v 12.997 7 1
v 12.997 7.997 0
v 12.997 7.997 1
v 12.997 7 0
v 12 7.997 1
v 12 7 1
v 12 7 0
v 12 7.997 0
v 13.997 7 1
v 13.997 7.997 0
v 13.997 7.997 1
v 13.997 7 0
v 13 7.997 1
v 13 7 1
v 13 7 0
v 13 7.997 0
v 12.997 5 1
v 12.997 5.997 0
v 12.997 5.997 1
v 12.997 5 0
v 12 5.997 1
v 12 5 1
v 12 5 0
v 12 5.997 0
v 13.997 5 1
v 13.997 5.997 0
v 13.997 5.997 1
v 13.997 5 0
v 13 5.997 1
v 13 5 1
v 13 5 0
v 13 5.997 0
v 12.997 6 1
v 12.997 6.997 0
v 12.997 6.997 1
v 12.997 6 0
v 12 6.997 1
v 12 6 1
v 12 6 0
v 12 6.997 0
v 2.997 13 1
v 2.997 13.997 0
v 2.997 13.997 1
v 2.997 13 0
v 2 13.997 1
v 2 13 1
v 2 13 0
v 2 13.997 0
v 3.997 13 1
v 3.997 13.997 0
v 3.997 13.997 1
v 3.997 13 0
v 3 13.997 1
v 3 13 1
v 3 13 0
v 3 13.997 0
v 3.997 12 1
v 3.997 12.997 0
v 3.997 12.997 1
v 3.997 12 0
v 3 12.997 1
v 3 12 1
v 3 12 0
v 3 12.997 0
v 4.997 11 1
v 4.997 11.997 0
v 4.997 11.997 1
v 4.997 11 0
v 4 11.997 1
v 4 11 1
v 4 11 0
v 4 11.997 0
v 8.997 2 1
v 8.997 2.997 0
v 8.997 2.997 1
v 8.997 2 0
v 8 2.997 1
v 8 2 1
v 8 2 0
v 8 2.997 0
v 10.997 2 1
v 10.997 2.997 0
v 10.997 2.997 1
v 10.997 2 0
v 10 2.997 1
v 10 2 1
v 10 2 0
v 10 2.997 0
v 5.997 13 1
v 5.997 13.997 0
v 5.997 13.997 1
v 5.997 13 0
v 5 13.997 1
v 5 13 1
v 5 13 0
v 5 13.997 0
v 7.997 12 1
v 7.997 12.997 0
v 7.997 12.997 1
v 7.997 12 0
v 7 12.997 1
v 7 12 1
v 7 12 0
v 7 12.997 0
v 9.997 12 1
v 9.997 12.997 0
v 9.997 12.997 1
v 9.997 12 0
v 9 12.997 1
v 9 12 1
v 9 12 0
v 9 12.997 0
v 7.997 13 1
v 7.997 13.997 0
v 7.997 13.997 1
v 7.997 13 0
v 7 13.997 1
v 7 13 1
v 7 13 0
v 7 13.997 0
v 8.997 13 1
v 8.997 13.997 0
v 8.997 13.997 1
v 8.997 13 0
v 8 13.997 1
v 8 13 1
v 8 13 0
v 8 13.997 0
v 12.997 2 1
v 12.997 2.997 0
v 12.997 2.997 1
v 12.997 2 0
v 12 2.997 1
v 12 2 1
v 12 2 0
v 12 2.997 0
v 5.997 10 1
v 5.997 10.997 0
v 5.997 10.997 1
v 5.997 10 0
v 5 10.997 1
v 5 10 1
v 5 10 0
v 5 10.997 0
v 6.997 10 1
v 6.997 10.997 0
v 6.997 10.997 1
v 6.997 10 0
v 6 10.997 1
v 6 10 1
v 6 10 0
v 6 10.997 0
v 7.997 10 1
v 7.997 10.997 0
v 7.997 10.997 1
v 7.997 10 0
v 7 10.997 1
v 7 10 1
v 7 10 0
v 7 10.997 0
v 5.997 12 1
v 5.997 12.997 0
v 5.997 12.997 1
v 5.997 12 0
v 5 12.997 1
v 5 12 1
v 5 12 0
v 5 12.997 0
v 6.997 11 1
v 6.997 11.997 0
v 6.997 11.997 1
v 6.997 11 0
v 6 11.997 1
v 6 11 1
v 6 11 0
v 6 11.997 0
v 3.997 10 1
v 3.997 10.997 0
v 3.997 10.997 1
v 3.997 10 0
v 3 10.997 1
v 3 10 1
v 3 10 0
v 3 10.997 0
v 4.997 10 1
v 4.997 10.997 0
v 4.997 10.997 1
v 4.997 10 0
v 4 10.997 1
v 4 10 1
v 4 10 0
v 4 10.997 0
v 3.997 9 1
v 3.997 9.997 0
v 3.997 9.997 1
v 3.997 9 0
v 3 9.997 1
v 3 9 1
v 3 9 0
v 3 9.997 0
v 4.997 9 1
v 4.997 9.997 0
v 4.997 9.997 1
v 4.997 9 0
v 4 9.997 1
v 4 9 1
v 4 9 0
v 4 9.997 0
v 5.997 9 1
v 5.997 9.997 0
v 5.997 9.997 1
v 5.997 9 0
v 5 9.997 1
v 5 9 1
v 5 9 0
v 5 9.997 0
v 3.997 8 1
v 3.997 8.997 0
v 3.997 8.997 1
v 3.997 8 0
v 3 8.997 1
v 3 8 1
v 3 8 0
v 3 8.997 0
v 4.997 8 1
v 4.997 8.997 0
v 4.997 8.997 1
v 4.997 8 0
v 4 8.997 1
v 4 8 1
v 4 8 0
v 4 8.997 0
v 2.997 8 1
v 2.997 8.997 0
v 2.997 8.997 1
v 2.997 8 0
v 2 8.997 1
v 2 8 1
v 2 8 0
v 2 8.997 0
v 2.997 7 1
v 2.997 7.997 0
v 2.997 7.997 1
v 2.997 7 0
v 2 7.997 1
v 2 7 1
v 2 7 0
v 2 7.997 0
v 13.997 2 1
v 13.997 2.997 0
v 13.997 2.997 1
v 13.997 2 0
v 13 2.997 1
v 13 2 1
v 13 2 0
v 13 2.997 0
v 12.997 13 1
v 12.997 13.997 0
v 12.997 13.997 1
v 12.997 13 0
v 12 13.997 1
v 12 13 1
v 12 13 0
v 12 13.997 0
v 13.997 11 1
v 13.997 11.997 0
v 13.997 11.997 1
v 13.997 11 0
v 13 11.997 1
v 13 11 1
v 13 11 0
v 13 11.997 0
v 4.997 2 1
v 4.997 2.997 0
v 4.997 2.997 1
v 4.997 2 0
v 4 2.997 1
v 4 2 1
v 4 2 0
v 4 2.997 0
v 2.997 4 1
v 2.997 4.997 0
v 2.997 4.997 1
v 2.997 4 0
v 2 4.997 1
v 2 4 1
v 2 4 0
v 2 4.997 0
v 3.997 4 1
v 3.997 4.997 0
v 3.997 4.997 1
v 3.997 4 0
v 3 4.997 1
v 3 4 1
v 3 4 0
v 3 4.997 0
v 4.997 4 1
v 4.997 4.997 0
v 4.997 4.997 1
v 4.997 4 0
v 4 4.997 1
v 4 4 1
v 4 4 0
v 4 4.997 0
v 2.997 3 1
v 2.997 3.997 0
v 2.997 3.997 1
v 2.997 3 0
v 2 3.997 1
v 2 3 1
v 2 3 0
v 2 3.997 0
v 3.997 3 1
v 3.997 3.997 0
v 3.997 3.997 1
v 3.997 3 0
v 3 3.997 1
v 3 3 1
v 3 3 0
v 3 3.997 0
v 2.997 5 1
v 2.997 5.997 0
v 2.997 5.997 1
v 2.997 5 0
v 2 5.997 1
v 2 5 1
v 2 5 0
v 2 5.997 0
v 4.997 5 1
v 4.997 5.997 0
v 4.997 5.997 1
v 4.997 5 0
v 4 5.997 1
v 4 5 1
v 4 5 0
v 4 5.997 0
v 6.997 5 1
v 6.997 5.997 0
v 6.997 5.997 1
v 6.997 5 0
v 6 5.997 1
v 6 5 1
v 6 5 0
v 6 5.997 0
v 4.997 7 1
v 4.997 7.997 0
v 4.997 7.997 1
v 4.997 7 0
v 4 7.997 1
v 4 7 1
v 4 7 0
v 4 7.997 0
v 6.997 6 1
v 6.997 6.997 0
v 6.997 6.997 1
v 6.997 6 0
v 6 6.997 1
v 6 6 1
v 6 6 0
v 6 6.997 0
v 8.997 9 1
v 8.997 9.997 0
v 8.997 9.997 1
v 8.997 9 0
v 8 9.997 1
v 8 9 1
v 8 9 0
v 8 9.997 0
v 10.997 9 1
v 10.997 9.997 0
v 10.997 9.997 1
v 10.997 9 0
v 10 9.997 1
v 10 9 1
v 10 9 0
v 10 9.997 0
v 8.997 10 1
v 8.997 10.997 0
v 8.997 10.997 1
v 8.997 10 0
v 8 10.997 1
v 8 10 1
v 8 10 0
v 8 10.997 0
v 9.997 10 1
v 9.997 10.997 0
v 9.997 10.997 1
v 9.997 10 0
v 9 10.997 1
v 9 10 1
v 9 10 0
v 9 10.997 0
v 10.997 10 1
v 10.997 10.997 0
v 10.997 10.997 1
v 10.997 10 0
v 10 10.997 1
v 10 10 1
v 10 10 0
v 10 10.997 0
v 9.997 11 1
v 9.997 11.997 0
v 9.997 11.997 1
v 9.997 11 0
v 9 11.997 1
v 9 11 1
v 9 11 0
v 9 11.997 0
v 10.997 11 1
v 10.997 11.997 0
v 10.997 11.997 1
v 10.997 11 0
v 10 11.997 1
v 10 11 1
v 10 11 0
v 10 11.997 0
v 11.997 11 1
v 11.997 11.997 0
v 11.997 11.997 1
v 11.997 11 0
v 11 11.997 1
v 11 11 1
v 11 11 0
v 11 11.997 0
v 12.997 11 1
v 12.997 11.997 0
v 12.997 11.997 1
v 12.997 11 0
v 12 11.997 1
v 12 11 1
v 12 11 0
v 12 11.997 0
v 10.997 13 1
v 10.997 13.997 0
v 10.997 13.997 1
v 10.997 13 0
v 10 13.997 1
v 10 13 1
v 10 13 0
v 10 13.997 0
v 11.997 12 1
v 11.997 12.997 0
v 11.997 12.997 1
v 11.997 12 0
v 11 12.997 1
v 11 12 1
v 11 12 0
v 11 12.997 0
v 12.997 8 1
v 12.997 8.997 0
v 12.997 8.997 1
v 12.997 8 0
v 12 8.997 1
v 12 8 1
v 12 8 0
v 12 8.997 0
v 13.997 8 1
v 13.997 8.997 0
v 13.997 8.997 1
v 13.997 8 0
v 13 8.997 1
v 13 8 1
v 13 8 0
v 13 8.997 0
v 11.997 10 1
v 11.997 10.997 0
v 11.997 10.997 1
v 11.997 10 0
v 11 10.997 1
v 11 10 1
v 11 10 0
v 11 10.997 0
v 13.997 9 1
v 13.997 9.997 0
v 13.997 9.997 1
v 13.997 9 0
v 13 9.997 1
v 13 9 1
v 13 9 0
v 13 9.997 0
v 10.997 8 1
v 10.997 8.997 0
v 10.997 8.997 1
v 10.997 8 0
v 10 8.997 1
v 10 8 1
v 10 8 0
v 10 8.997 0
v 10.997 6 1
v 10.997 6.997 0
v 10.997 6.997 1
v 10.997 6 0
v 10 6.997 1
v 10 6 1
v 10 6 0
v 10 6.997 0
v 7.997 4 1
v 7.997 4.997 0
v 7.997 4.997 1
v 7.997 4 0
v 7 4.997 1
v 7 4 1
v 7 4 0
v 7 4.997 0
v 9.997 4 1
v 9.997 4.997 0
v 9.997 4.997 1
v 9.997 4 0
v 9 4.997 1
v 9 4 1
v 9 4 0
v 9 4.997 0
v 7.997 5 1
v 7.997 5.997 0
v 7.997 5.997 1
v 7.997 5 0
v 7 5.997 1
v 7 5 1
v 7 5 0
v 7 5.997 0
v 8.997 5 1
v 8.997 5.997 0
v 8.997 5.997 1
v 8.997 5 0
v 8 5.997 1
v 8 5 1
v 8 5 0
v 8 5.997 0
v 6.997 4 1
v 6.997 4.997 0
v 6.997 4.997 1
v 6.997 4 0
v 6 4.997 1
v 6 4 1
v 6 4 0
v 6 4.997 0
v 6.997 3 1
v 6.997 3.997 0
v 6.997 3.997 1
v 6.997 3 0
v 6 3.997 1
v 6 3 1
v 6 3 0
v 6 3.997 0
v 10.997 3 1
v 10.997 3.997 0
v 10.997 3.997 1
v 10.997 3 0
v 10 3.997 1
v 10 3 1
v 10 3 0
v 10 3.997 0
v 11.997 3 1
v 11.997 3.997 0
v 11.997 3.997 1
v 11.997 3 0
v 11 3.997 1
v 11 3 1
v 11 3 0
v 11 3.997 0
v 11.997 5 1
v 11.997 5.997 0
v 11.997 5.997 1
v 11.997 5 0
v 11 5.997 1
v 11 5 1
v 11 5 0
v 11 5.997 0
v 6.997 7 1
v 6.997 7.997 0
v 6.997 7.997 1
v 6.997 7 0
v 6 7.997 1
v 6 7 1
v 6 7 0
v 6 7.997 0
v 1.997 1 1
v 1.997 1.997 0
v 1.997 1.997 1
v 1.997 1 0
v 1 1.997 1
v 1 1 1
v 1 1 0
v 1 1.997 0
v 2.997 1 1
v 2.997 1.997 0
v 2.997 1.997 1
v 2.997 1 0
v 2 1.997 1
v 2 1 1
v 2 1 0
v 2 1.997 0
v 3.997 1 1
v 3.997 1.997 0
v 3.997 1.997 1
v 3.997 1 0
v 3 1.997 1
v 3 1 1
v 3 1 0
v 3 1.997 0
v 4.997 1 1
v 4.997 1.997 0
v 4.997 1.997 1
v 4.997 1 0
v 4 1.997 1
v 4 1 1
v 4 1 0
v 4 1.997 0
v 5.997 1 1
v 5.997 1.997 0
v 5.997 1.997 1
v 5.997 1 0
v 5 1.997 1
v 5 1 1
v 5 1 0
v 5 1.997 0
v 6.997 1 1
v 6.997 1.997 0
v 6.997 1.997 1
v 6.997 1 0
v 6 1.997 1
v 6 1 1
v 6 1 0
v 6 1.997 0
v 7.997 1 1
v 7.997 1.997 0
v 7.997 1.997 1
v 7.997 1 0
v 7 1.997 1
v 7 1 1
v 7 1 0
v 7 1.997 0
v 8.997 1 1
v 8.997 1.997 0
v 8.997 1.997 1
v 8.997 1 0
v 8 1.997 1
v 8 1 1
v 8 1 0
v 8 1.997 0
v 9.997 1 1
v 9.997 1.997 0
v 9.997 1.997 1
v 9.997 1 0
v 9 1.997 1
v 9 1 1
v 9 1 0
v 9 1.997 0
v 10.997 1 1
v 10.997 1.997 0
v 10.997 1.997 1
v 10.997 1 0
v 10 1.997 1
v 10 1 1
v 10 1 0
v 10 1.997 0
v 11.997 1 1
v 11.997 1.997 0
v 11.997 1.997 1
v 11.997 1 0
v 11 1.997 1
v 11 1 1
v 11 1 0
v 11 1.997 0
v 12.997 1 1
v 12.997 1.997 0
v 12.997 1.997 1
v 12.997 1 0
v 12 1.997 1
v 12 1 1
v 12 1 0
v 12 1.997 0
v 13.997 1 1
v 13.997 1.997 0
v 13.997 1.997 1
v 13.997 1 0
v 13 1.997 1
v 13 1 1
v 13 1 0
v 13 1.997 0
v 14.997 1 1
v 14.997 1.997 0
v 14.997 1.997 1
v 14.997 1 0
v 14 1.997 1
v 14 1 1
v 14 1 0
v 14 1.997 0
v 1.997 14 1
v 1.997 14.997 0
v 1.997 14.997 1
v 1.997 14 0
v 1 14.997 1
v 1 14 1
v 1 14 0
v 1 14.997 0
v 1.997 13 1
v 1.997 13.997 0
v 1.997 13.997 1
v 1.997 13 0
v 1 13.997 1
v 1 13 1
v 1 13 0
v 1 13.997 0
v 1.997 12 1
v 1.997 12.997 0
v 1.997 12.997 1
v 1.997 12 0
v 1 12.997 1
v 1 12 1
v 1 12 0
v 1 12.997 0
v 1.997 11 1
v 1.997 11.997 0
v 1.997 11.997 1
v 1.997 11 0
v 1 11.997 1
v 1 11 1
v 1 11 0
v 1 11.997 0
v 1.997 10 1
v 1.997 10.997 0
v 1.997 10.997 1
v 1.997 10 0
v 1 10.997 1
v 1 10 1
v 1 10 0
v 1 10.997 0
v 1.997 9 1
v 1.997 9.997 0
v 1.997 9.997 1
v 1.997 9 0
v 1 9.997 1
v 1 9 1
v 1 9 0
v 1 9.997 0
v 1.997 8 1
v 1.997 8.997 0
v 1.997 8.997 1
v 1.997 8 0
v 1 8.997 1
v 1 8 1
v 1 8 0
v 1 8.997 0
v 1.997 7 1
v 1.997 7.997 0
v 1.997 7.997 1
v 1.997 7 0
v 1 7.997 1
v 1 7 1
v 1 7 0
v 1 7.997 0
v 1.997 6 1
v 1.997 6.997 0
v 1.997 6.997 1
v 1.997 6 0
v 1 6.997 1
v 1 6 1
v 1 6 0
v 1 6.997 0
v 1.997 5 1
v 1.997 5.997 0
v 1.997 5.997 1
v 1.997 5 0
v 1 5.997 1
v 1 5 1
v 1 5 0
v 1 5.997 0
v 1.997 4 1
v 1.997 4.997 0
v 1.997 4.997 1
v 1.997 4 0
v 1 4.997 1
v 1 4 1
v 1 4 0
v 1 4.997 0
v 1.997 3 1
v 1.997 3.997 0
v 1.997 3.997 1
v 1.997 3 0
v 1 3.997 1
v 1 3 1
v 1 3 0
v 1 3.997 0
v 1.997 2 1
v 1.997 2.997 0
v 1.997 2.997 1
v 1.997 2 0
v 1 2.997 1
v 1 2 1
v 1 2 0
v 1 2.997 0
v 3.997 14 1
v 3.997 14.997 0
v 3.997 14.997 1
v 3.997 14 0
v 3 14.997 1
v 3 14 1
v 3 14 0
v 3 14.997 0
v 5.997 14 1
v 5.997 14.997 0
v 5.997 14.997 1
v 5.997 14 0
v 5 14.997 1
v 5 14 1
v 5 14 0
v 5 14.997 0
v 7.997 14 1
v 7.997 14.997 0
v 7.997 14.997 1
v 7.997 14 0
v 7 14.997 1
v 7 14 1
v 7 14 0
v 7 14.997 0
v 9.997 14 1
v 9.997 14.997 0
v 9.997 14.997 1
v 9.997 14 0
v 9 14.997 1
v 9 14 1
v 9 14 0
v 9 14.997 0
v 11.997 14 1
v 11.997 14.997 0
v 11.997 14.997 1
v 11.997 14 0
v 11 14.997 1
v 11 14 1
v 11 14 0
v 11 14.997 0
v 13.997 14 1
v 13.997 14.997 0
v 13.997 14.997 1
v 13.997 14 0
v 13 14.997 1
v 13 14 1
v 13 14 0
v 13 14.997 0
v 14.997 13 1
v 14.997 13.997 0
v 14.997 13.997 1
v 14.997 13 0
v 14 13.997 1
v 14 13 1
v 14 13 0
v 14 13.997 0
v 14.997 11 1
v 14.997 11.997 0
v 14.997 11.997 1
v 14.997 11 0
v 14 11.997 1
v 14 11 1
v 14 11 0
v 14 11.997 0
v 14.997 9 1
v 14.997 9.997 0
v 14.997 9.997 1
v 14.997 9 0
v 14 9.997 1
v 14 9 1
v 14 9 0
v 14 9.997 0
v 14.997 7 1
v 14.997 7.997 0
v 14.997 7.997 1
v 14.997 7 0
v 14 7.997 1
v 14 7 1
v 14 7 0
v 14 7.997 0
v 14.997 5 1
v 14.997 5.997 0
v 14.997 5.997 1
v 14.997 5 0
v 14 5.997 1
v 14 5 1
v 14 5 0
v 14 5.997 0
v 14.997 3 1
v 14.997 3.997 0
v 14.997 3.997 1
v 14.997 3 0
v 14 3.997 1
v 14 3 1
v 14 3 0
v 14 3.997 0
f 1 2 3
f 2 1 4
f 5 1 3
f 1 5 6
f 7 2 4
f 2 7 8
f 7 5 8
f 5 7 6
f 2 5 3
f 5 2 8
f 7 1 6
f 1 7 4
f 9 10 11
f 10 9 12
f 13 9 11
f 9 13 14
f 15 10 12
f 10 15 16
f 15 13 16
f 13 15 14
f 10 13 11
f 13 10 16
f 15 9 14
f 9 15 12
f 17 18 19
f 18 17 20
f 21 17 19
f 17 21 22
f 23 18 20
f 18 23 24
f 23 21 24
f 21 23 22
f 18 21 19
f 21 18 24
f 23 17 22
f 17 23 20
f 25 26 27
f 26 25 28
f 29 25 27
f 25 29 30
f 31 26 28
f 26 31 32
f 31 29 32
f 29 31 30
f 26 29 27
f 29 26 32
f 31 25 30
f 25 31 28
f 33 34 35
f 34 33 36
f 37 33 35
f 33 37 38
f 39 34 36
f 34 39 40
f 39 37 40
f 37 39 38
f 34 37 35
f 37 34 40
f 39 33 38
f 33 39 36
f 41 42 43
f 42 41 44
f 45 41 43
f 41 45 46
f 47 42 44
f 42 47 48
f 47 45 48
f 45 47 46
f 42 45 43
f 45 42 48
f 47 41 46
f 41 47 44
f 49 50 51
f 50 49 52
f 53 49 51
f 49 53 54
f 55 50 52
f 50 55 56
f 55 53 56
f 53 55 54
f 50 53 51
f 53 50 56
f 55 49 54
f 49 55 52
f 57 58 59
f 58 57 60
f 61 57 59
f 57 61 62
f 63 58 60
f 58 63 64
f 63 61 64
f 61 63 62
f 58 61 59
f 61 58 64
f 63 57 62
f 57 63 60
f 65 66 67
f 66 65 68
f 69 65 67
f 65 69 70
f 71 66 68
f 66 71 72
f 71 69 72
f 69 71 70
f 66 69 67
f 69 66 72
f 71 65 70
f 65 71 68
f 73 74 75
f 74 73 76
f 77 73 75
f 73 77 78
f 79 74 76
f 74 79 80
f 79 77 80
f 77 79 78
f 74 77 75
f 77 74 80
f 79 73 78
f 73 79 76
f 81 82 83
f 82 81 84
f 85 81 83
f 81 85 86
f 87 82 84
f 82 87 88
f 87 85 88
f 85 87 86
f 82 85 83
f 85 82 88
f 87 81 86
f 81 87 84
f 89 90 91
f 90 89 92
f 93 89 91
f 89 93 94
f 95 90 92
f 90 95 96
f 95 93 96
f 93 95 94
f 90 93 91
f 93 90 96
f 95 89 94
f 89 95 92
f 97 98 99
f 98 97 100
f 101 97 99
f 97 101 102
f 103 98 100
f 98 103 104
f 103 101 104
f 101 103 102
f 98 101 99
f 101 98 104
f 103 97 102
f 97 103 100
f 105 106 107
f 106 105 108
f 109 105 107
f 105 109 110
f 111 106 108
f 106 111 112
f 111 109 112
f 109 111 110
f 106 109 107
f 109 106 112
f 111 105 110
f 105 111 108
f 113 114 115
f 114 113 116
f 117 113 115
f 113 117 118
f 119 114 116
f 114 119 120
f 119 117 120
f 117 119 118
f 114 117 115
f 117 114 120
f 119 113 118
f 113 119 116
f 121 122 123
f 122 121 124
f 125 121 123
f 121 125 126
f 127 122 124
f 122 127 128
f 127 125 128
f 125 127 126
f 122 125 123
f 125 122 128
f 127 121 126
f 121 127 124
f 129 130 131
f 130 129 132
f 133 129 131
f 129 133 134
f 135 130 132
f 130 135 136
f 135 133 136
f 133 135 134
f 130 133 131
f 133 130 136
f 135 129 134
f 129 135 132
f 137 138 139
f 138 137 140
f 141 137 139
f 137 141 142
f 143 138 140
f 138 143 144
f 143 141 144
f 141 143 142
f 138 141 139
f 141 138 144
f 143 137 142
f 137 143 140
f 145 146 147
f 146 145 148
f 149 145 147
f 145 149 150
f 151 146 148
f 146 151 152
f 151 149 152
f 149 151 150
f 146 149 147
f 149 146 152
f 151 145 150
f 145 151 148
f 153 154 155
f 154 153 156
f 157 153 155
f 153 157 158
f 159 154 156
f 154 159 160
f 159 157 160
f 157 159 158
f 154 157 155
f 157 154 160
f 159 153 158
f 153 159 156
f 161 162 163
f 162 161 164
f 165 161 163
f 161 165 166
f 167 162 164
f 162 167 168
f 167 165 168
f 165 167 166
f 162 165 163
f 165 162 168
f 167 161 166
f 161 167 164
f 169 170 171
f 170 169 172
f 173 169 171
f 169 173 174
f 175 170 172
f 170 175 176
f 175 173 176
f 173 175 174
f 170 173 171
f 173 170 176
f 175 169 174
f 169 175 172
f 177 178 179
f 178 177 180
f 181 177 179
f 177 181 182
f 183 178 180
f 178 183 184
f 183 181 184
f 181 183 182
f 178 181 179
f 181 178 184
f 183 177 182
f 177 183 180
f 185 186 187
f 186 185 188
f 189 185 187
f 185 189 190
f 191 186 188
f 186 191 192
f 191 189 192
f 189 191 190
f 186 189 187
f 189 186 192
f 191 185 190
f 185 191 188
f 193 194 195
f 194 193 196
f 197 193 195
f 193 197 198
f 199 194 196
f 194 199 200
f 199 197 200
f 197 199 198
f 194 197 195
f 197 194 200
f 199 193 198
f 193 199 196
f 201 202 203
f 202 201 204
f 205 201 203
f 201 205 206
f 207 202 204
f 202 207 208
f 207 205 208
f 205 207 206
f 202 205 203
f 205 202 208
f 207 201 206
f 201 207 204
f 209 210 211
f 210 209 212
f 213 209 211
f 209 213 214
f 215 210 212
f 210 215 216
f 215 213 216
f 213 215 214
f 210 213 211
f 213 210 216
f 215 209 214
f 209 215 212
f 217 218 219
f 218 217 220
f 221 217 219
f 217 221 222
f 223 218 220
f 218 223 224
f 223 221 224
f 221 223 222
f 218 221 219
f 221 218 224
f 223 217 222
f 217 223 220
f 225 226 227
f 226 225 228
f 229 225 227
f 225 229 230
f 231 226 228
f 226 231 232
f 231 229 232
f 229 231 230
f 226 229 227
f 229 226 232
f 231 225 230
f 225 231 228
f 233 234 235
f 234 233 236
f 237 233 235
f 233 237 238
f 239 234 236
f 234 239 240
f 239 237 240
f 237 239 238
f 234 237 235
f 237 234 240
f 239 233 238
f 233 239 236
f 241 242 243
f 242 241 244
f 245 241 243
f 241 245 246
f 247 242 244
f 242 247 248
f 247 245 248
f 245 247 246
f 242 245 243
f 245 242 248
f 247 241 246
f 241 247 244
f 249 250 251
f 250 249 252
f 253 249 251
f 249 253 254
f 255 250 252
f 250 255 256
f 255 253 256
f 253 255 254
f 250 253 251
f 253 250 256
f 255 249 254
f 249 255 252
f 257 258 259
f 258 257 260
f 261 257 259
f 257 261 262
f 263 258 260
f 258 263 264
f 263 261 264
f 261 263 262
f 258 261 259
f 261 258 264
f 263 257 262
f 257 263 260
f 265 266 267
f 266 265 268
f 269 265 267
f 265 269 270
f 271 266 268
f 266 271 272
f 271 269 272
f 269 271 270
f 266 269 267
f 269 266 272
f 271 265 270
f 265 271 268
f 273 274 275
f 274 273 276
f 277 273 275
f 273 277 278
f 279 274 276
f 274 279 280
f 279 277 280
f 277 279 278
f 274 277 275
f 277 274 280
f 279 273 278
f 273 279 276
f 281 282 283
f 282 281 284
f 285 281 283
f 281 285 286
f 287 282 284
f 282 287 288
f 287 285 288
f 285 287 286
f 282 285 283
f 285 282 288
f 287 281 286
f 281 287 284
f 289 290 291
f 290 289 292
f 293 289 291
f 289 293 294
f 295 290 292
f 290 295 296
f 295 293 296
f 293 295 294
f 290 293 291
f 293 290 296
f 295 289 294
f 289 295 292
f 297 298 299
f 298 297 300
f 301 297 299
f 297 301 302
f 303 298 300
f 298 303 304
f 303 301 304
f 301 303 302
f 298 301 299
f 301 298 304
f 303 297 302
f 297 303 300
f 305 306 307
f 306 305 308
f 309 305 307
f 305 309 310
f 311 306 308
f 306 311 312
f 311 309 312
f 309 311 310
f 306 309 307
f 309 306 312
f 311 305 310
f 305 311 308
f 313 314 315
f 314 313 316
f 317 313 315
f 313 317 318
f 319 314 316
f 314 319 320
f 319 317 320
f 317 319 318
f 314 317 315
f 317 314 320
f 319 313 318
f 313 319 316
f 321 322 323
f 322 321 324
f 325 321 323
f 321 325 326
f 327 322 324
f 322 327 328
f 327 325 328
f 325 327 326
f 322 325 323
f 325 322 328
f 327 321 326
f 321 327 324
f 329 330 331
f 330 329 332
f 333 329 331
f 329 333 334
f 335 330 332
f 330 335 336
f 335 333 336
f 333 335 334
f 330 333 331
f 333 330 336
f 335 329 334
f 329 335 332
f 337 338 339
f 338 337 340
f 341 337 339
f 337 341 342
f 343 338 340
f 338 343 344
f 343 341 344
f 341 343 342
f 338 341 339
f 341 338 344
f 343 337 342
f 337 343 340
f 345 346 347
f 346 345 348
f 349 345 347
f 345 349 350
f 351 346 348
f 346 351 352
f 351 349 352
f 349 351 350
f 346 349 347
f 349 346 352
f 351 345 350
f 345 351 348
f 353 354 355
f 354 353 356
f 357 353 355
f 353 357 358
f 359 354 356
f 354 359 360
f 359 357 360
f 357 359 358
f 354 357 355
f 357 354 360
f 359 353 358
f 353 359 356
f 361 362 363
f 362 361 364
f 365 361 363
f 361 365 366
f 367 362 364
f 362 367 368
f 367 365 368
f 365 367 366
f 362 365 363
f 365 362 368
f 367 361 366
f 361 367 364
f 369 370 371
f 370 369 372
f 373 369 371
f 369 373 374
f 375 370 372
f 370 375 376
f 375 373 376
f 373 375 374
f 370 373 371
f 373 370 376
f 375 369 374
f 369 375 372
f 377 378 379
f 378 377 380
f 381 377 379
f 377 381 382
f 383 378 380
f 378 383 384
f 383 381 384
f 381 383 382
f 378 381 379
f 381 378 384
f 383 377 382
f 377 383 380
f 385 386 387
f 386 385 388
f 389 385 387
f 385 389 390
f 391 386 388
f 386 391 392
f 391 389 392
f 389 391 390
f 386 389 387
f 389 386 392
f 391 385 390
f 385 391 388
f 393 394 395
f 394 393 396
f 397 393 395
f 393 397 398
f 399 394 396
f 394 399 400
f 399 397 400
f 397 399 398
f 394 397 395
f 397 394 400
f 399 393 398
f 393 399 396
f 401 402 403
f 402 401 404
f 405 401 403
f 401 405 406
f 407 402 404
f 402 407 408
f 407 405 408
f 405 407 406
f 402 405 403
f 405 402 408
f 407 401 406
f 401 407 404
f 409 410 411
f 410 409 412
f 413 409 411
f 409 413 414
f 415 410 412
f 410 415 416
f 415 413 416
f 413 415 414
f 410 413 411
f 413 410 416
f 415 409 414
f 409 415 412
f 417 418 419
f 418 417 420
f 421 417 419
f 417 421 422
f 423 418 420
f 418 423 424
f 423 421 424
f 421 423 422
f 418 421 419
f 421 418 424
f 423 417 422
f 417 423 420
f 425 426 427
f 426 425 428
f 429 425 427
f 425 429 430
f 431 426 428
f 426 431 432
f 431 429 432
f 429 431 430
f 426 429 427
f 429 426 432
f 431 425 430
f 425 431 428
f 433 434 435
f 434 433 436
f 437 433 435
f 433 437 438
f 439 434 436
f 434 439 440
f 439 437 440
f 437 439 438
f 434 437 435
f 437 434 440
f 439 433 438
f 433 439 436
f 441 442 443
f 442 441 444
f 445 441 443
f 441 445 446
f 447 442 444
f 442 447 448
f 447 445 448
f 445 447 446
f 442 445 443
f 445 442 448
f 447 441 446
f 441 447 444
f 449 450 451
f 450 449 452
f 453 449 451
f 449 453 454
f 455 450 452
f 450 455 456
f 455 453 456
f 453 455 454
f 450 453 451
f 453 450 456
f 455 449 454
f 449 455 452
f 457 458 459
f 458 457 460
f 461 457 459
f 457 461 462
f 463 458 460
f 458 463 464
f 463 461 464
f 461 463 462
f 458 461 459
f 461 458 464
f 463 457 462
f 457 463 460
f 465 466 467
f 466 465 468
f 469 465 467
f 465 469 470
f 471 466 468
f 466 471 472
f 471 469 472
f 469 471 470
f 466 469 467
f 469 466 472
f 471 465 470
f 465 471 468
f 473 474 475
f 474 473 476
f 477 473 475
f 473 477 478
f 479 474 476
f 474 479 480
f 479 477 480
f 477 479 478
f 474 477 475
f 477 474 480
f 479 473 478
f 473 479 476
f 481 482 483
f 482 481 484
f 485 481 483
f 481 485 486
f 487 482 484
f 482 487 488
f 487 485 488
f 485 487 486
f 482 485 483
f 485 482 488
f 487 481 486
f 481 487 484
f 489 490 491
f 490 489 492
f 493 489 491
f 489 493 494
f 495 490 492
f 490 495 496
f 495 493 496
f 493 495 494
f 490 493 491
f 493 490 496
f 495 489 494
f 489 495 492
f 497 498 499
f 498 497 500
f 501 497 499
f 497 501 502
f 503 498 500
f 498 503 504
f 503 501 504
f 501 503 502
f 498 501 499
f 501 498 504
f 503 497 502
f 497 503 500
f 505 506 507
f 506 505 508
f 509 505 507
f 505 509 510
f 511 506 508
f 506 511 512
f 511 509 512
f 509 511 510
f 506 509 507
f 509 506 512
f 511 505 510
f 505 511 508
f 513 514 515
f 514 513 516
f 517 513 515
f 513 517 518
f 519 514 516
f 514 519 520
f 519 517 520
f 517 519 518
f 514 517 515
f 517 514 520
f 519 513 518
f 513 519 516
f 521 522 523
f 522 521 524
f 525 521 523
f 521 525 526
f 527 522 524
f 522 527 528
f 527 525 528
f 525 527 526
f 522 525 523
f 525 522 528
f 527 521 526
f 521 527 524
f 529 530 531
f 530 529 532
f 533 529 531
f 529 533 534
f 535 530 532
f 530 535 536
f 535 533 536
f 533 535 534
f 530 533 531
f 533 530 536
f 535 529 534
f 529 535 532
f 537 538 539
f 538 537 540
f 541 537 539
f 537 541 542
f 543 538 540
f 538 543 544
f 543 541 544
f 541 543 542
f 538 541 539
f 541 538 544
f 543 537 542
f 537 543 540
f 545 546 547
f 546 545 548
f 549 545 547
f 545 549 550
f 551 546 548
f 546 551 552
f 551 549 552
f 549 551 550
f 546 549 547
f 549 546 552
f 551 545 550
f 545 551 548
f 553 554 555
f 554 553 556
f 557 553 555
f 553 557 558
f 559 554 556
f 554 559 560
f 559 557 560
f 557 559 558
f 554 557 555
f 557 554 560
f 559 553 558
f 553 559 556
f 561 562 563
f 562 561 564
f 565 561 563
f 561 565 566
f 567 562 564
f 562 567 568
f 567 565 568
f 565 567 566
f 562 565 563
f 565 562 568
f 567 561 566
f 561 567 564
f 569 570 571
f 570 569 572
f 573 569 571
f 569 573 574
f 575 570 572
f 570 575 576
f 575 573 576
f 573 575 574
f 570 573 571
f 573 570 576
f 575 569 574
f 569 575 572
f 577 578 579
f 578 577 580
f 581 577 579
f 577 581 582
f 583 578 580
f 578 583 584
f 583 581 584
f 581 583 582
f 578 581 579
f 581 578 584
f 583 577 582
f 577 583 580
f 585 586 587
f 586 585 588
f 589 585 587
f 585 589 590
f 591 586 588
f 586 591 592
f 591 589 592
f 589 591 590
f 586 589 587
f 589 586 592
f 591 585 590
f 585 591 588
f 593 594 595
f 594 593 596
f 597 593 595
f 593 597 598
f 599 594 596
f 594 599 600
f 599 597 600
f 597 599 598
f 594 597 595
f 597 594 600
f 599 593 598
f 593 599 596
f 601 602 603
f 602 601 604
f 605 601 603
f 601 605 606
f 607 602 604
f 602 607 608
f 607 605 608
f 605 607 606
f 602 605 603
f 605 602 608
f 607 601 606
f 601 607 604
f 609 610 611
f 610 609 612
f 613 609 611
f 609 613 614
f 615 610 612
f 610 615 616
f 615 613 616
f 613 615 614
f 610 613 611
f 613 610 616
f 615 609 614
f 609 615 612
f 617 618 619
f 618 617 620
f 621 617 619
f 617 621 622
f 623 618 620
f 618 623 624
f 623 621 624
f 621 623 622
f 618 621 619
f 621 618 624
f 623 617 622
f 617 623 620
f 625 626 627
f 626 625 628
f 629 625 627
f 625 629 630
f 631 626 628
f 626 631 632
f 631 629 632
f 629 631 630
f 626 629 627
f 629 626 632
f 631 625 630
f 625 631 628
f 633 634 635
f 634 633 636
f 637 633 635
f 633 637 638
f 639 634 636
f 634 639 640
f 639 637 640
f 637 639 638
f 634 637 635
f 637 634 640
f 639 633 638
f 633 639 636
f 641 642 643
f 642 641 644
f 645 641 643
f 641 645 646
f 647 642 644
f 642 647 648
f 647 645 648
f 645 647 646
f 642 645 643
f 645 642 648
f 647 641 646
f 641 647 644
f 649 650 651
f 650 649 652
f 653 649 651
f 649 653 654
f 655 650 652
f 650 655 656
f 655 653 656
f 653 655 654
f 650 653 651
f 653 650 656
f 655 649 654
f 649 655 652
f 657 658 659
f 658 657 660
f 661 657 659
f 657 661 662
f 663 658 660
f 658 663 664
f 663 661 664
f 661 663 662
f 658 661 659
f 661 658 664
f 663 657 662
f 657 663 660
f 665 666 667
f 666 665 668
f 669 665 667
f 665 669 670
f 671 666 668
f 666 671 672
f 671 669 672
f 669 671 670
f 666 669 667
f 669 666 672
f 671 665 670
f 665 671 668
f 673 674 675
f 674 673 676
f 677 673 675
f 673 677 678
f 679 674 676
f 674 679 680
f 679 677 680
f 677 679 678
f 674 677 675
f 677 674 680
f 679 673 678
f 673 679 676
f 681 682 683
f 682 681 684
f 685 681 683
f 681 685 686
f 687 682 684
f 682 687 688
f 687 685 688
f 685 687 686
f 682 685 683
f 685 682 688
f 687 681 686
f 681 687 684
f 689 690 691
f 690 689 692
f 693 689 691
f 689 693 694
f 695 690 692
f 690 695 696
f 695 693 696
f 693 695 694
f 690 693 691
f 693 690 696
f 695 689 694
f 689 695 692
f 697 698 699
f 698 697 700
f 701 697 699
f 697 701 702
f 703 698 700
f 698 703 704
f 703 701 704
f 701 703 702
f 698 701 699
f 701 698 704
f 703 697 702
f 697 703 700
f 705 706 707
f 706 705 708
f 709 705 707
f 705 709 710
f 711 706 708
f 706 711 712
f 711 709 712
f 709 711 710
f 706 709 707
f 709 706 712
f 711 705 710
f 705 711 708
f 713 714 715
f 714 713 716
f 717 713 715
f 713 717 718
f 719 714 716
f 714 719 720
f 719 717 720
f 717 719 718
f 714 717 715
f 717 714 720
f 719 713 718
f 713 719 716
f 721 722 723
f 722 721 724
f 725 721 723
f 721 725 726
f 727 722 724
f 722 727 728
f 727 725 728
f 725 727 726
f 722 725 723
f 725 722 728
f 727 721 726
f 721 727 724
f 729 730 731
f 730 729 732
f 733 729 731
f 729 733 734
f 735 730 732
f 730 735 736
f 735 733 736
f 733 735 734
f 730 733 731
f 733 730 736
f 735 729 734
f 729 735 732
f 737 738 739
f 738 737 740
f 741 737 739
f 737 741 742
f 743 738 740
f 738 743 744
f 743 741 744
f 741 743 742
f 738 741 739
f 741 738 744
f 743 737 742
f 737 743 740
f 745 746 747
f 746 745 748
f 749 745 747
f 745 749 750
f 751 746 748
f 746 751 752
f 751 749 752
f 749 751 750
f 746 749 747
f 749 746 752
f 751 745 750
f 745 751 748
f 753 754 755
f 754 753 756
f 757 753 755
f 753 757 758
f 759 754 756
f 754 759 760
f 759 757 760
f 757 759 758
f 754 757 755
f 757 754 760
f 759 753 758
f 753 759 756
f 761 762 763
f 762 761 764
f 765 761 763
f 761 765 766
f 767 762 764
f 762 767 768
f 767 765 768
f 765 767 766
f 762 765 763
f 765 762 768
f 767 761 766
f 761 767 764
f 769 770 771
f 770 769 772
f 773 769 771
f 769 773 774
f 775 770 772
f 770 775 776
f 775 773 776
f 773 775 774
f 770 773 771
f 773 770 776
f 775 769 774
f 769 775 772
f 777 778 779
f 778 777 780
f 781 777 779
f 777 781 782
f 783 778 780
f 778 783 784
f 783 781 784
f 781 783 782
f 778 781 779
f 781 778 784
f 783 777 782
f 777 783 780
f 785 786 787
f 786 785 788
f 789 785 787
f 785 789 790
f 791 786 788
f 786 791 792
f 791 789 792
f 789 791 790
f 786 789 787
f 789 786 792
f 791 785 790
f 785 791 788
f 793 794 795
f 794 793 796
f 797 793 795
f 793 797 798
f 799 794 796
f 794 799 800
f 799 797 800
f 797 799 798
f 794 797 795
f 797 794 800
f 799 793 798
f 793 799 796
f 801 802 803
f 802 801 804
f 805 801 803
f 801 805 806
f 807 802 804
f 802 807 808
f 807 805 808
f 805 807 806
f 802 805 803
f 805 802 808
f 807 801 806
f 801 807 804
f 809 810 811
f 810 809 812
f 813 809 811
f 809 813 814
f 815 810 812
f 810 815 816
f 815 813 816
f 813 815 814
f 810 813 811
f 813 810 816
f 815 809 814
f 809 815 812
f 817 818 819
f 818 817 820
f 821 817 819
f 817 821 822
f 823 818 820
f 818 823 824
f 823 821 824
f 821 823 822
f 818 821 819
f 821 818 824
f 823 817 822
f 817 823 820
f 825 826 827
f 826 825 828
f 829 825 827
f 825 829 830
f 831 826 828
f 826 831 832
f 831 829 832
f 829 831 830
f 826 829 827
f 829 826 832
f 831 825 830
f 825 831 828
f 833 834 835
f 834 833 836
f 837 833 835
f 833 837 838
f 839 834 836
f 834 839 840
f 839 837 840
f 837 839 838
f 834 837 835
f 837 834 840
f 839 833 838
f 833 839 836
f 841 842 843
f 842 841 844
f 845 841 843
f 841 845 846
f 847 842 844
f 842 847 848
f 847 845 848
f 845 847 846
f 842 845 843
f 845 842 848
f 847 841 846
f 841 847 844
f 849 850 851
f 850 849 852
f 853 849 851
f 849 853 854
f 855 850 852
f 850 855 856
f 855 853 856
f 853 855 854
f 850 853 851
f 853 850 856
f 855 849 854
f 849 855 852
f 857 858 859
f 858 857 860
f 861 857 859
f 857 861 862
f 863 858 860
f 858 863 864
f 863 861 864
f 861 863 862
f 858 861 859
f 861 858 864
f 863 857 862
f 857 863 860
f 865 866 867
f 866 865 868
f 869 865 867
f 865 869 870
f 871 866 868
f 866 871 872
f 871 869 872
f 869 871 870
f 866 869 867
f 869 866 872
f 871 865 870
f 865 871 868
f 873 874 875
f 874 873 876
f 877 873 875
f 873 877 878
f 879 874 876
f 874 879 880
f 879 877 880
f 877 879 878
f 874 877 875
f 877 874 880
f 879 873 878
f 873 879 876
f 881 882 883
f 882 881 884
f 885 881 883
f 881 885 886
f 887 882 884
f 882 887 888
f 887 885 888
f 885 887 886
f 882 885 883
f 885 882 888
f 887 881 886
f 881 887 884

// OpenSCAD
// file: ../../util/bitmap.scad
/*****************************************************************************
 * Module Bitmap Library
 * Modules to create bitmaps of unit squares from 1 or 2 dimensional vectors.
 *****************************************************************************
 * Copyright 2017 Chris Baker
 *
 * This program is free software: you can redistribute it and/or modify
 * it under the terms of the GNU Lesser General Public License as published by
 * the Free Software Foundation, either version 3 of the License, or
 * (at your option) any later version.
 *
 * This program is distributed in the hope that it will be useful,
 * but WITHOUT ANY WARRANTY; without even the implied warranty of
 * MERCHANTABILITY or FITNESS FOR A PARTICULAR PURPOSE.  See the
 * GNU Lesser General Public License for more details.
 *
 * You should have received a copy of the GNU Lesser General Public License
 * along with this program.  If not, see <http://www.gnu.org/licenses/>.
 *****************************************************************************
 * Usage:
 * Include this file with the "use" tag.
 * Depends on compat.scad library.
 *
 * API:
 *   1dbitmap(bitmap, center, pullback, vector_mode)
 *   2dbitmap(bitmap, center, pullback, vector_mode)
 *     Generate a 1 or 2-Dimensional field of modules based on the provided
 *     bitmap vector. See Bitmap Vectors below.
 *     The center flag determines whether to center the bitmap on the origin.
 *     The pullback value shrinks each module in the x and y dimension by the
 *     specified amount. A negative value will expand the modules so they
 *     blend into each other.
 *     The vector_mode flag determines whether to create 3D solid geometry
 *     (unit cubes) or 2D vector geometry (squares).
 *
 * Bitmap Vectors:
 *   The bitmap vectors primarily provide boolean information.
 *   A module will be placed where these vectors have a postive value and
 *   skipped where they have a negative value. I.E. 0, -1, false, and undef
 *   are all equivalent and result in a skip. 1 and true are equivalent and
 *   result in a placed 1-unit module.
 *   Further, if the value is an integer it will be treated as a height for
 *   the module, allowing z-maps to be created.
 *   If the value is not an integer or boolean, it will be treated as a color
 *   reference. This can be a string or RGBA vector that will be used to
 *   color the module in the OpenSCAD preview window.
 *   In current versions of OpenSCAD, the color has no effect in the rendered
 *   view or STL output.
 *
 * Vector Mode:
 *   Although OpenSCAD supports generating 2D geometry, there are several
 *   caveats:
 *   - 2D and 3D geometry cannot be mixed
 *   - Extruding 2D geometry causes color information to be lost
 *   - All 2D geometry is projected onto the XY plane when rendering
 *   - Rendering also results in loss of color (same as 3D)
 *   - The SVG exporter is somewhat limited:
 *     - The pixel size of the image is hard-coded in the file
 *     - The title of the image is a generic string
 *     - The color selection for stroke and fill is fixed
 *     - The stroke-width is set to a large value that will cause overlap
 *     - The background is transparent
 *     - Only one path element is created with all of the geometry; there is
 *       no easy way to split up the geometry into multiple logical units.
 *     - These issues can mostly be resolved by hand-editing the file:
 *       - Remove or modify the width and height parameters from the svg
 *         element at the top of the file to provide better scaling.
 *       - Edit the title element at the top of the file to change the title.
 *       - Edit the stroke and fill parameters of the path element (these will
 *         probably be at the end of the file).
 *       - Set the stroke-width parameter for the path element to 0.
 *****************************************************************************/
use <compat.scad>

/*
 * 2dbitmap - Turn a 2D vector into a bitmap of cubes
 *
 * bitmap - 2D vector representing where to place each cube
 *          Value can either be boolean, z-height, or color
 * center - center cubes around the origin
 * pullback - size of gap around each pixel (screendoor)
 * vector_mode - create a 2D vector drawing instead of 3D extrusion
 */
module 2dbitmap(bitmap=[[1,0],[0,1]], center=false, pullback=0.003, vector_mode=false)
{
  if (bitmap!=undef) {
	ylen=len(bitmap)-1;

	for (y=[0:ylen]) {
		xlen=len(bitmap[y])-1;
		for (x=[0:xlen])
			translate([x-(center?xlen/2:0),ylen-y-(center?ylen/2:0),0])
				if (is_indexable(bitmap[y][x]))
					color(bitmap[y][x])
						if (vector_mode)
							square([1-pullback,1-pullback], center=center);
						else
							cube([1-pullback,1-pullback,1], center=center);
				else
					if (bitmap[y][x])
						if (vector_mode)
							square([1-pullback,1-pullback], center=center);
						else
							cube([1-pullback,1-pullback,clamp_nonnum(bitmap[y][x])], center=center);
	}
  }
}

module 1dbitmap(bitmap=[1,0,1,0,1], center=false, pullback=-0.003, vector_mode=false)
	if (bitmap!=undef)
		2dbitmap([bitmap], center, pullback, vector_mode);

/*
 * Examples
 */

// 1D with z-height
translate([10,0,0]) scale([1,10,1])
	1dbitmap(bitmap=[1,1,0,2,0,0,3], pullback=.1);

// 1D with boolean
translate([-20,0,0]) scale([1,10,1])
	1dbitmap(bitmap=[true,false,true,false,true,true]);

// 2D with z-height
scale([2,2,1])
	2dbitmap(bitmap=[[1,0,2,1],[0,3,3,0],[1,1,0,1]],
		center=true);

// 1D with color
translate([0,-10,0]) scale([1,3,1])
	1dbitmap(bitmap=["red","white","blue",[0,0.3,0,0.5]]);

// 1D with color using 2D-vector-mode
translate([-7,-8,0]) scale([1,2])
	1dbitmap(bitmap=["red",0,"blue",0,"green"], vector_mode=true);
translate([-4.5,-10,0]) scale([1,2])
	1dbitmap(bitmap=["red",0,"blue",0,"green"], vector_mode=true, center=true);

// Check behavior with undef
1dbitmap(undef);
2dbitmap(undef);
// file: ../../util/bitlib.scad
/*****************************************************************************
 * Bit Manipulation Library
 * Provides some useful bit manipulation functions.
 *****************************************************************************
 * Copyright 2017 Chris Baker
 *
 * This program is free software: you can redistribute it and/or modify
 * it under the terms of the GNU Lesser General Public License as published by
 * the Free Software Foundation, either version 3 of the License, or
 * (at your option) any later version.
 *
 * This program is distributed in the hope that it will be useful,
 * but WITHOUT ANY WARRANTY; without even the implied warranty of
 * MERCHANTABILITY or FITNESS FOR A PARTICULAR PURPOSE.  See the
 * GNU Lesser General Public License for more details.
 *
 * You should have received a copy of the GNU Lesser General Public License
 * along with this program.  If not, see <http://www.gnu.org/licenses/>.
 *****************************************************************************
 * Usage:
 * Include this file with the "use" tag.
 * When run on its own, all echo statements in this library should print
 * "true".
 *
 * API:
 *   bit(v,b)
 *     Return the truth value of the b'th bit of v.
 *
 *   check_bit_size(v,b,signed=false)
 *     Determine whether the value v can be represented with b bits (b must
 *     be positive).
 *     The signed flag indicates whether to include the sign bit in the
 *     determination; otherwise negative values will result in undef being
 *     returned.
 *
 *   xor(a,b)
 *     Return the value of a xor b.
 *     Handles arbitrary size values for a and b.
 *     Handles negative values as expected (a positive result will be returned
 *     unless a and b have differing signs).
 *
 * TODO:
 *  - Change echos to asserts (future OpenSCAD version)
 *  - Add more functions
 *
 *****************************************************************************/

//Return the truth value of the b'th bit of v
function bit(v,b) =
	((v==undef)||(b==undef)||(b<0))?undef:
	(floor(v / pow(2, b)) % 2)?true:false;

echo("*** bit() testcases ***");
echo(0,bit(0,0)==false);
echo(1,bit(-1,0)==true);
echo(2,bit(1,0)==true);
echo(3,[for (i=[0:63]) bit(0,i)]==[for (i=[0:63]) false]); //0=0...0
echo(4,[for (i=[0:63]) bit(-1,i)]==[for (i=[0:63]) true]); //-1=1...1
echo(5,[for (i=[1:63]) bit(1,i)]==[for (i=[1:63]) false]); //1=0...01
echo(6,[for (i=[0:7]) bit(85,i)?1:0]==[1,0,1,0,1,0,1,0]); //85=01010101
echo(7,[for (i=[0:7]) bit(170,i)?1:0]==[0,1,0,1,0,1,0,1]); //170=10101010
echo(8,[for (i=[0:7]) bit(165,i)?1:0]==[1,0,1,0,0,1,0,1]); //165=10100101
echo(9,[for (i=[0:7]) bit(56,i)?1:0]==[0,0,0,1,1,1,0,0]); //56=00111000
echo(10,[for (i=[0:7]) bit(-3,i)?1:0]==[1,0,1,1,1,1,1,1]); //-3=1...101
//(2^64)=0...01 0...0
echo(11,bit(pow(2,64),64)==true);
echo(12,[for (i=[0:63]) bit(pow(2,64),i)]==[for (i=[0:63]) false]);
echo(13,[for (i=[65:127]) bit(pow(2,64),i)]==[for (i=[1:63]) false]);
//-(2^64)=1...1 0...0
echo(14,[for (i=[0:63]) bit(-pow(2,64),i)]==[for (i=[0:63]) false]);
echo(15,[for (i=[64:127]) bit(-pow(2,64),i)]==[for (i=[0:63]) true]);
echo(16,bit(10,-1)==undef);
echo(17,bit(10,undef)==undef);
echo(18,bit(undef,3)==undef);

//return true if v can be represented in b bits
//if signed flag is set. the result will be adjusted
//to account for the needed sign bit
function check_bit_size(v,b,signed=false) =
	(b<0)?undef:
	(v==undef)?undef:
	(b==0)?false:
	(v==0)?true: //(b>0)
	(signed)?
		(v<0)?(-pow(2,b-1)<(v+1)):
			(pow(2,b-1)>(v+1)):
		(v<0)?undef:
			(pow(2,b)>v);

echo("*** check_bit_size() testcases ***");
echo(0,check_bit_size(-1,2)==undef);
echo(1,check_bit_size(2,-4)==undef);
echo(2,check_bit_size(2,-4,signed=true)==undef);
echo(3,check_bit_size(0,0)==false);
echo(4,check_bit_size(0,1)==true);
echo(5,check_bit_size(1,0)==false);
echo(6,check_bit_size(1,1)==true);
echo(7,check_bit_size(7,3)==true);
echo(8,check_bit_size(8,3)==false);
echo(9,check_bit_size(1,3)==true);
echo(10,check_bit_size(256,8)==false);
echo(11,check_bit_size(255,8)==true);
echo(12,check_bit_size(10,2)==false);
echo(13,check_bit_size(10,4)==true);
echo(14,check_bit_size(-10,2,signed=true)==false);
echo(15,check_bit_size(-10,4,signed=true)==false);
echo(16,check_bit_size(-10,5,signed=true)==true);
echo(17,check_bit_size(-1,0,signed=true)==false);
echo(18,check_bit_size(-1,1,signed=true)==true);
echo(19,check_bit_size(0,0,signed=true)==false);
echo(20,check_bit_size(0,1,signed=true)==true);
echo(21,check_bit_size(-2,2,signed=true)==true);
echo(22,check_bit_size(-3,2,signed=true)==false);
echo(23,check_bit_size(-3,3,signed=true)==true);
echo(24,check_bit_size(-8,3,signed=true)==false);
echo(25,check_bit_size(-8,4,signed=true)==true);
echo(26,check_bit_size(undef,4)==undef);
echo(27,check_bit_size(undef,4,signed=true)==undef);

//return the value of a xor b
//runs recursively until all bits of a and b are exhausted
function xor(a,b,i=0) =
	((a==undef)||(b==undef))?undef:
	let (c=bit(a,i), d=bit(b,i),
		 v=((c||d) && !(c&&d))?pow(2,i):0)
		(check_bit_size(a,i,signed=true) &&
		 check_bit_size(b,i,signed=true))?
			-v: //special case for sign bit
			v+xor(a,b,i+1); //recursively add powers of 2

echo("*** xor() testcases ***");
echo(0,xor(42,0)==42);
echo(1,xor(42,42)==0);
echo(2,xor(169,238)==71); //10101001^11101110=01000111=71
echo(3,xor(238,169)==71);
echo(4,xor(42,238)==196); //00101010^11101110=11000100=196
echo(5,xor(169,42)==131); //10101001^00101010=10000011=131
echo(6,xor(-8,-10)==14); //11000^10110=01110=14
echo(7,xor(-7,-10)==15); //11001^10110=01111=15
echo(8,xor(9,-10)==-1); //01001^10110=11111=-1
echo(9,xor(9,-12)==-3); //01001^10100=11101=-3
echo(10,xor(undef,0)==undef);
// file: ../../util/stringlib.scad
/*****************************************************************************
 * String Manipulation Library
 * Provides some useful string manipulation functions.
 *****************************************************************************
 * Copyright 2017 Chris Baker
 *
 * This program is free software: you can redistribute it and/or modify
 * it under the terms of the GNU Lesser General Public License as published by
 * the Free Software Foundation, either version 3 of the License, or
 * (at your option) any later version.
 *
 * This program is distributed in the hope that it will be useful,
 * but WITHOUT ANY WARRANTY; without even the implied warranty of
 * MERCHANTABILITY or FITNESS FOR A PARTICULAR PURPOSE.  See the
 * GNU Lesser General Public License for more details.
 *
 * You should have received a copy of the GNU Lesser General Public License
 * along with this program.  If not, see <http://www.gnu.org/licenses/>.
 *****************************************************************************
 * Usage:
 * Include this file with the "use" tag.
 * Depends on compat.scad library.
 *
 * API:
 *   atoi(a)
 *     Convert the string of numerals, a, to a vector of individual decimal
 *     numbers.
 *
 *   ascii_to_vec(a)
 *     Convert the ASCII string, a, into a vector of decimal numbers.
 *
 *****************************************************************************/
use <compat.scad>

/*
 * atoi - convert ASCII numerals to a vector of individual decimal numbers
 *
 * a - the ASCII string of numerals
 */
function atoi(a) = (isa_string(a))?
	[
		let (val = search(a, "0123456789"))
			for (i = val) i
	]
	:
	undef;

/* *** atoi() testcases *** */
do_assert(atoi(undef)==undef,     "atoi test 00");
do_assert(atoi(true)==undef,      "atoi test 01");
do_assert(atoi(false)==undef,     "atoi test 02");
do_assert(atoi([])==undef,        "atoi test 03");
do_assert(atoi([1,2,3])==undef,   "atoi test 04");
do_assert(atoi("")==[],           "atoi test 05");
do_assert(atoi("0")==[0],         "atoi test 06");
do_assert(atoi("1")==[1],         "atoi test 07");
do_assert(atoi("2")==[2],         "atoi test 08");
do_assert(atoi("3")==[3],         "atoi test 09");
do_assert(atoi("4")==[4],         "atoi test 10");
do_assert(atoi("5")==[5],         "atoi test 11");
do_assert(atoi("6")==[6],         "atoi test 12");
do_assert(atoi("7")==[7],         "atoi test 13");
do_assert(atoi("8")==[8],         "atoi test 14");
do_assert(atoi("9")==[9],         "atoi test 15");
do_assert(atoi("123")==[1,2,3],   "atoi test 16");
do_assert(atoi("1a23b")==[1,2,3], "atoi test 17"); //degenerate case, don't really care too much about the result

/*
 * ascii_to_vec - convert ASCII string to decimal vector
 *
 * a - the ASCII string to vectorize
 */
function ascii_to_vec(a) = (isa_string(a))?
	[
		let (val = search(a, "\x01\x02\x03\x04\x05\x06\x07\x08\x09\x0a\x0b\x0c\x0d\x0e\x0f\x10\x11\x12\x13\x14\x15\x16\x17\x18\x19\x1a\x1b\x1c\x1d\x1e\x1f !\"#$%&'()*+,-./0123456789:;<=>?@ABCDEFGHIJKLMNOPQRSTUVWXYZ[\\]^_`abcdefghijklmnopqrstuvwxyz{|}~\x7f"))
			for (i = val) i+1
	]:
	undef;

/* *** ascii_to_vec() testcases *** */
do_assert(ascii_to_vec(undef)==undef,   "ascii_to_vec test 01");
do_assert(ascii_to_vec(true)==undef,    "ascii_to_vec test 02");
do_assert(ascii_to_vec(false)==undef,   "ascii_to_vec test 03");
do_assert(ascii_to_vec([])==undef,      "ascii_to_vec test 04");
do_assert(ascii_to_vec([1,2,3])==undef, "ascii_to_vec test 05");
do_assert(ascii_to_vec("")==[],         "ascii_to_vec test 06");
do_assert(ascii_to_vec("0")==[48],      "ascii_to_vec test 07");
do_assert(ascii_to_vec("a")==[97],      "ascii_to_vec test 08");
do_assert(ascii_to_vec("0123456789")==[48,49,50,51,52,53,54,55,56,57],
	"ascii_to_vec test 09");
do_assert(ascii_to_vec("The quick brown fox jumped over the lazy dog.")
	==[84,104,101,32,113,117,105,99,107,32,98,114,111,119,110,32,102,111,120,32,106,117,109,112,101,100,32,111,118,101,114,32,116,104,101,32,108,97,122,121,32,100,111,103,46],
	"ascii_to_vec test 10");
// main file
/* Unit Test 04: 14x14 - 8 data bytes, 10 ecc bytes - mixed-mode */
use <../datamatrix.scad>
data_matrix(
	concat(
		c40_mode(),
		dm_c40("TELESI"),
		ascii_mode(),
		dm_ascii("S1")
	),
	mark="black");
